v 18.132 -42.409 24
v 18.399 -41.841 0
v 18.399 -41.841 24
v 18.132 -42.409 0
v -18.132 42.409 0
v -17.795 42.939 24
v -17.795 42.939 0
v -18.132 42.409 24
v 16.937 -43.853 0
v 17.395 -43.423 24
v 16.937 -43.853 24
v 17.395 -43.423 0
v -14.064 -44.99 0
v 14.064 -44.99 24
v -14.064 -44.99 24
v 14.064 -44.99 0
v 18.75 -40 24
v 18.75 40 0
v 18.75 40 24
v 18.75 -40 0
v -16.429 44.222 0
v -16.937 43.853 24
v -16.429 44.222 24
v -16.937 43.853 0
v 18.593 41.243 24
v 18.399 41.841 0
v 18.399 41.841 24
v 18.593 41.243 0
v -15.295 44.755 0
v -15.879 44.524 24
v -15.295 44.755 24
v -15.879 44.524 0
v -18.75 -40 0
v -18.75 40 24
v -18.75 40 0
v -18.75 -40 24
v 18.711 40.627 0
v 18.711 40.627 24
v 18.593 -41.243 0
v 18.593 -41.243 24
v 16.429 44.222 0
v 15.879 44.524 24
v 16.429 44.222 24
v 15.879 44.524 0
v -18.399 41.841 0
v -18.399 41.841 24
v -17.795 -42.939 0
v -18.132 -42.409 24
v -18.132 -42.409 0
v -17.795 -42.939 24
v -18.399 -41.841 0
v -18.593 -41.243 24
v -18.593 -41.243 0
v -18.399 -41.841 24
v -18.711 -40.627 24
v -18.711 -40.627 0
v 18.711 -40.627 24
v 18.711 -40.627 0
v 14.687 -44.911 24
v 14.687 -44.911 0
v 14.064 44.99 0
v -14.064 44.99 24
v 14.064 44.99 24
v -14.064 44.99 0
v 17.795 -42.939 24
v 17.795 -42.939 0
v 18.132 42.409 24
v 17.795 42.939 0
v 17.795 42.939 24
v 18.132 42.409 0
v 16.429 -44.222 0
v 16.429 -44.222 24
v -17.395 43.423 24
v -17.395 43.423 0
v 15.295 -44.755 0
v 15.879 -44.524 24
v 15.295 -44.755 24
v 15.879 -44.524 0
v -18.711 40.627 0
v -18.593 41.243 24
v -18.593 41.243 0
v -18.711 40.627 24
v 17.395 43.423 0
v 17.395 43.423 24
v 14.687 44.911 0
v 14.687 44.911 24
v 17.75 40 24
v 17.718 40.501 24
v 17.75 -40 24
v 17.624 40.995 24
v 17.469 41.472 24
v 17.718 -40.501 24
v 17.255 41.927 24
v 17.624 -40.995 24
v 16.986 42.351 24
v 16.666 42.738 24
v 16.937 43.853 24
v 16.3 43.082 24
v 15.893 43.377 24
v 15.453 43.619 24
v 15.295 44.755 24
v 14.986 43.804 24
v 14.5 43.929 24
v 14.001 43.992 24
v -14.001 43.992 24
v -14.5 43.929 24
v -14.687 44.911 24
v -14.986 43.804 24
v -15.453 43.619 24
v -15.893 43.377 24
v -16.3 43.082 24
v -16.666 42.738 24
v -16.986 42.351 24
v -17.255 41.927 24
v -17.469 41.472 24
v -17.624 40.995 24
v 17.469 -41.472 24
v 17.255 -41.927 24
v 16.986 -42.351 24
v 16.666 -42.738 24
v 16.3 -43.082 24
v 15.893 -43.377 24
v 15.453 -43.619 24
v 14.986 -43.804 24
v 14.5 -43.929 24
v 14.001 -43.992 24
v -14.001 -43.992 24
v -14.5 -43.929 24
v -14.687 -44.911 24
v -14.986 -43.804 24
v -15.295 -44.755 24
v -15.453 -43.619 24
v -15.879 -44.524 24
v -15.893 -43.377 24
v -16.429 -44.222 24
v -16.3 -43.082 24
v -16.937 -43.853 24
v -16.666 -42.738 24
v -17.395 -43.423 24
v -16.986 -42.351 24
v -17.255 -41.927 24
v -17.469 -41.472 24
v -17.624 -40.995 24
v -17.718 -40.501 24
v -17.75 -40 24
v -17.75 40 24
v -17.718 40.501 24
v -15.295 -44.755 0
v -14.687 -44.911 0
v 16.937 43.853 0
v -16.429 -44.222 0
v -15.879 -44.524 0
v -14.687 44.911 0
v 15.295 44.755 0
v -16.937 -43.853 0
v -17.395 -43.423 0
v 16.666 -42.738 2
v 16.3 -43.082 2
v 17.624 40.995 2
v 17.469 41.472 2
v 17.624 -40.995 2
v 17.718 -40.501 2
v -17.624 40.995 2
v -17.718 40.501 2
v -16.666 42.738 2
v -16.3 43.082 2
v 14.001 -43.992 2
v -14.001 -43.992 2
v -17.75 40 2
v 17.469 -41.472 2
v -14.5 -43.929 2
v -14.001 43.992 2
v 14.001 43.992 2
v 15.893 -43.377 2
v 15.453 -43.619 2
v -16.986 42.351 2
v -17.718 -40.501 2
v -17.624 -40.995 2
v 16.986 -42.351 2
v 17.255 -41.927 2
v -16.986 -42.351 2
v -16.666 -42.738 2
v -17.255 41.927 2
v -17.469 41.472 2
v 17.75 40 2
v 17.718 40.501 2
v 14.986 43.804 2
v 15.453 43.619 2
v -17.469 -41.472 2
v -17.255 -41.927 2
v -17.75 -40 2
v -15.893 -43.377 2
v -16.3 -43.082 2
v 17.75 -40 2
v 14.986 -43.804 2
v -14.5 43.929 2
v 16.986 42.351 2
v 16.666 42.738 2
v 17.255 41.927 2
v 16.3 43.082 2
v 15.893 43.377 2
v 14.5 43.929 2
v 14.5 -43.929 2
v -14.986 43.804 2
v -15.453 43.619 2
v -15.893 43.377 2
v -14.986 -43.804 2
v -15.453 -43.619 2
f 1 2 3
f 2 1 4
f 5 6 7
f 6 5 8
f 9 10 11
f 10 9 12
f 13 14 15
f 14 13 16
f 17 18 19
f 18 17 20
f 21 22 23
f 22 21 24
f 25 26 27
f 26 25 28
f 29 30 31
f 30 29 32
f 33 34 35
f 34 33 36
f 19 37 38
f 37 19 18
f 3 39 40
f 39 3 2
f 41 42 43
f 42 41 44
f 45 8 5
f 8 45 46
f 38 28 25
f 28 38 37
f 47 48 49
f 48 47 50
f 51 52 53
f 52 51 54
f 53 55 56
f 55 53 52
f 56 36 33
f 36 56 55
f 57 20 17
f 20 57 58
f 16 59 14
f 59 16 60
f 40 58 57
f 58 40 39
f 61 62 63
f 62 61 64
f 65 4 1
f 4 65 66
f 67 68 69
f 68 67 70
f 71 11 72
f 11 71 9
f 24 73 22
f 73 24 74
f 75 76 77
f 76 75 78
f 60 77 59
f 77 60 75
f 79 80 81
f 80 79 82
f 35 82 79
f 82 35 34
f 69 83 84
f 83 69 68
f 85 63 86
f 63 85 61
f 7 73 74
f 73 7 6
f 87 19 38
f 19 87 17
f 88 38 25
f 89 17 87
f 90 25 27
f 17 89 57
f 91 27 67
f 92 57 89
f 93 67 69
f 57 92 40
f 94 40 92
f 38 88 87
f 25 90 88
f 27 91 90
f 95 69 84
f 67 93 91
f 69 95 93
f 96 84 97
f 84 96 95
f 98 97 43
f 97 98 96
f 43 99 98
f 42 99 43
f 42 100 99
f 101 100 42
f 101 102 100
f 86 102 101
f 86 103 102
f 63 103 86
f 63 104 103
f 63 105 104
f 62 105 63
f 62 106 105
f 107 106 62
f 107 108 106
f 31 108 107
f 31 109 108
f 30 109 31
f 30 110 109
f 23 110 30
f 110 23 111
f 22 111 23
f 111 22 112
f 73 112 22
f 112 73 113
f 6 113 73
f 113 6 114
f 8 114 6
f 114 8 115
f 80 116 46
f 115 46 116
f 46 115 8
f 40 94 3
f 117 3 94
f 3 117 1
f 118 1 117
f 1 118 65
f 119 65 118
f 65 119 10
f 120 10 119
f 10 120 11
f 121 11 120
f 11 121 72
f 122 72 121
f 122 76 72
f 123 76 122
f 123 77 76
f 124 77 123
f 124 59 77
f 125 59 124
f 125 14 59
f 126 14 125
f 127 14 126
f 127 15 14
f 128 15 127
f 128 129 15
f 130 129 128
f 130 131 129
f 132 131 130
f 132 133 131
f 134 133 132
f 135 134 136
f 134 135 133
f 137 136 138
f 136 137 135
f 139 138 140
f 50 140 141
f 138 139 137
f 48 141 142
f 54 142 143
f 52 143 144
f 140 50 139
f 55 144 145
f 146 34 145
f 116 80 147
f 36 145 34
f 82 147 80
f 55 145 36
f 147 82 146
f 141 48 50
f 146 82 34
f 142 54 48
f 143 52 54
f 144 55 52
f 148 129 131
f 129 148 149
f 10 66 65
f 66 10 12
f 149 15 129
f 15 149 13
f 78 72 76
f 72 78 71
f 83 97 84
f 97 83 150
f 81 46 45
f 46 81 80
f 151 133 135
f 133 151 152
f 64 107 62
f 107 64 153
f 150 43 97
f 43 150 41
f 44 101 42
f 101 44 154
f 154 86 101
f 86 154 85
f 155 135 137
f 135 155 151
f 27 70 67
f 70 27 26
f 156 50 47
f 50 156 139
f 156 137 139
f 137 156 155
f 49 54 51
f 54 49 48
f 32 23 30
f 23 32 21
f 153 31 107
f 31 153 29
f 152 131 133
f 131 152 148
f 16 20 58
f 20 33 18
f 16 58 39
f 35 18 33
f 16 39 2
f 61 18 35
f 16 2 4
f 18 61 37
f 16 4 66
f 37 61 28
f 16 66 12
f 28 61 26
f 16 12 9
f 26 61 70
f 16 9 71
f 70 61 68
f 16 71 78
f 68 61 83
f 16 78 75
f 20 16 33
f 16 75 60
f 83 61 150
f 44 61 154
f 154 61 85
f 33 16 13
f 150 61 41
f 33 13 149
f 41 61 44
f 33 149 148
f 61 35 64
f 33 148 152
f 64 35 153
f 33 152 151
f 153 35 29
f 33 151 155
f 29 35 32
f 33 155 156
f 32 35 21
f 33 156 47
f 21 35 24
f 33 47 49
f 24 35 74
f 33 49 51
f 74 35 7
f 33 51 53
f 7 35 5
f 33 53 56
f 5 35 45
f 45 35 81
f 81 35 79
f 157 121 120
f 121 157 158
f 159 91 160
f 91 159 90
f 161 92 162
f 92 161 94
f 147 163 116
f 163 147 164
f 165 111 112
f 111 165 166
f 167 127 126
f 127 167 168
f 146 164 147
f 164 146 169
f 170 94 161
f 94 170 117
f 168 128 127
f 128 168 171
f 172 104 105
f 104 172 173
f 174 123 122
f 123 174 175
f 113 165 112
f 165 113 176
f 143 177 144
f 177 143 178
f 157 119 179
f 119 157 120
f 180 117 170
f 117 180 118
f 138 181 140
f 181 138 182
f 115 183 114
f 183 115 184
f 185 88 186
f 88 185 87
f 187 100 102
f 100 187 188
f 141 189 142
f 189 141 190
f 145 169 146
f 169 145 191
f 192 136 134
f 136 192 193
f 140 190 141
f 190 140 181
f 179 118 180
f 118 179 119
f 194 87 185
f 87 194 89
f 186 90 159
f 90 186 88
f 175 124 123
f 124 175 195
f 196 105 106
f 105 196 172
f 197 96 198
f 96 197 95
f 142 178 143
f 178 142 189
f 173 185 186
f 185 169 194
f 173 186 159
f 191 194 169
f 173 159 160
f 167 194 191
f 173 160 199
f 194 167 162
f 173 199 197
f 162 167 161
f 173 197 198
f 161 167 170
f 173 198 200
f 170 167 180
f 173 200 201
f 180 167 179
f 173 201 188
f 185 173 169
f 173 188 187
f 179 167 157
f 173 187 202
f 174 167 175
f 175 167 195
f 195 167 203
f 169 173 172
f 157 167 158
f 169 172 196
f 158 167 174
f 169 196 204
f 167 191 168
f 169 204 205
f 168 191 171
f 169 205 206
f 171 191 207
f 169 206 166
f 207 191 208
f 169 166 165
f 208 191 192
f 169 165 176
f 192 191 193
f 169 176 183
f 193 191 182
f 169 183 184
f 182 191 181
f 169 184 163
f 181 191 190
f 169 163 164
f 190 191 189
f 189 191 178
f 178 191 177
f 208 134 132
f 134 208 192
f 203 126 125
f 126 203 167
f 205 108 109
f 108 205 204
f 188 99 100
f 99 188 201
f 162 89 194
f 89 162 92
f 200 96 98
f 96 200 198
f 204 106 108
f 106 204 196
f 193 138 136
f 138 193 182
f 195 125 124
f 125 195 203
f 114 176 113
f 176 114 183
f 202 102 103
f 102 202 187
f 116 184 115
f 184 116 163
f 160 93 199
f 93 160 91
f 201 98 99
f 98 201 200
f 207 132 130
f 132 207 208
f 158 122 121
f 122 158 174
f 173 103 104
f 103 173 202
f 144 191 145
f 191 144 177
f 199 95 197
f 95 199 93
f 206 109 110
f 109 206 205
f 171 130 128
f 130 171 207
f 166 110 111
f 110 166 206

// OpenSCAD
$fn = 50;


difference() {
	union() {
		hull() {
			translate(v = [-13.7500000000, 40.0000000000, 0]) {
				cylinder(h = 24, r = 5);
			}
			translate(v = [13.7500000000, 40.0000000000, 0]) {
				cylinder(h = 24, r = 5);
			}
			translate(v = [-13.7500000000, -40.0000000000, 0]) {
				cylinder(h = 24, r = 5);
			}
			translate(v = [13.7500000000, -40.0000000000, 0]) {
				cylinder(h = 24, r = 5);
			}
		}
	}
	union() {
		translate(v = [0, 0, 2]) {
			hull() {
				translate(v = [-13.7500000000, 40.0000000000, 0]) {
					cylinder(h = 22, r = 4);
				}
				translate(v = [13.7500000000, 40.0000000000, 0]) {
					cylinder(h = 22, r = 4);
				}
				translate(v = [-13.7500000000, -40.0000000000, 0]) {
					cylinder(h = 22, r = 4);
				}
				translate(v = [13.7500000000, -40.0000000000, 0]) {
					cylinder(h = 22, r = 4);
				}
			}
		}
	}
}
